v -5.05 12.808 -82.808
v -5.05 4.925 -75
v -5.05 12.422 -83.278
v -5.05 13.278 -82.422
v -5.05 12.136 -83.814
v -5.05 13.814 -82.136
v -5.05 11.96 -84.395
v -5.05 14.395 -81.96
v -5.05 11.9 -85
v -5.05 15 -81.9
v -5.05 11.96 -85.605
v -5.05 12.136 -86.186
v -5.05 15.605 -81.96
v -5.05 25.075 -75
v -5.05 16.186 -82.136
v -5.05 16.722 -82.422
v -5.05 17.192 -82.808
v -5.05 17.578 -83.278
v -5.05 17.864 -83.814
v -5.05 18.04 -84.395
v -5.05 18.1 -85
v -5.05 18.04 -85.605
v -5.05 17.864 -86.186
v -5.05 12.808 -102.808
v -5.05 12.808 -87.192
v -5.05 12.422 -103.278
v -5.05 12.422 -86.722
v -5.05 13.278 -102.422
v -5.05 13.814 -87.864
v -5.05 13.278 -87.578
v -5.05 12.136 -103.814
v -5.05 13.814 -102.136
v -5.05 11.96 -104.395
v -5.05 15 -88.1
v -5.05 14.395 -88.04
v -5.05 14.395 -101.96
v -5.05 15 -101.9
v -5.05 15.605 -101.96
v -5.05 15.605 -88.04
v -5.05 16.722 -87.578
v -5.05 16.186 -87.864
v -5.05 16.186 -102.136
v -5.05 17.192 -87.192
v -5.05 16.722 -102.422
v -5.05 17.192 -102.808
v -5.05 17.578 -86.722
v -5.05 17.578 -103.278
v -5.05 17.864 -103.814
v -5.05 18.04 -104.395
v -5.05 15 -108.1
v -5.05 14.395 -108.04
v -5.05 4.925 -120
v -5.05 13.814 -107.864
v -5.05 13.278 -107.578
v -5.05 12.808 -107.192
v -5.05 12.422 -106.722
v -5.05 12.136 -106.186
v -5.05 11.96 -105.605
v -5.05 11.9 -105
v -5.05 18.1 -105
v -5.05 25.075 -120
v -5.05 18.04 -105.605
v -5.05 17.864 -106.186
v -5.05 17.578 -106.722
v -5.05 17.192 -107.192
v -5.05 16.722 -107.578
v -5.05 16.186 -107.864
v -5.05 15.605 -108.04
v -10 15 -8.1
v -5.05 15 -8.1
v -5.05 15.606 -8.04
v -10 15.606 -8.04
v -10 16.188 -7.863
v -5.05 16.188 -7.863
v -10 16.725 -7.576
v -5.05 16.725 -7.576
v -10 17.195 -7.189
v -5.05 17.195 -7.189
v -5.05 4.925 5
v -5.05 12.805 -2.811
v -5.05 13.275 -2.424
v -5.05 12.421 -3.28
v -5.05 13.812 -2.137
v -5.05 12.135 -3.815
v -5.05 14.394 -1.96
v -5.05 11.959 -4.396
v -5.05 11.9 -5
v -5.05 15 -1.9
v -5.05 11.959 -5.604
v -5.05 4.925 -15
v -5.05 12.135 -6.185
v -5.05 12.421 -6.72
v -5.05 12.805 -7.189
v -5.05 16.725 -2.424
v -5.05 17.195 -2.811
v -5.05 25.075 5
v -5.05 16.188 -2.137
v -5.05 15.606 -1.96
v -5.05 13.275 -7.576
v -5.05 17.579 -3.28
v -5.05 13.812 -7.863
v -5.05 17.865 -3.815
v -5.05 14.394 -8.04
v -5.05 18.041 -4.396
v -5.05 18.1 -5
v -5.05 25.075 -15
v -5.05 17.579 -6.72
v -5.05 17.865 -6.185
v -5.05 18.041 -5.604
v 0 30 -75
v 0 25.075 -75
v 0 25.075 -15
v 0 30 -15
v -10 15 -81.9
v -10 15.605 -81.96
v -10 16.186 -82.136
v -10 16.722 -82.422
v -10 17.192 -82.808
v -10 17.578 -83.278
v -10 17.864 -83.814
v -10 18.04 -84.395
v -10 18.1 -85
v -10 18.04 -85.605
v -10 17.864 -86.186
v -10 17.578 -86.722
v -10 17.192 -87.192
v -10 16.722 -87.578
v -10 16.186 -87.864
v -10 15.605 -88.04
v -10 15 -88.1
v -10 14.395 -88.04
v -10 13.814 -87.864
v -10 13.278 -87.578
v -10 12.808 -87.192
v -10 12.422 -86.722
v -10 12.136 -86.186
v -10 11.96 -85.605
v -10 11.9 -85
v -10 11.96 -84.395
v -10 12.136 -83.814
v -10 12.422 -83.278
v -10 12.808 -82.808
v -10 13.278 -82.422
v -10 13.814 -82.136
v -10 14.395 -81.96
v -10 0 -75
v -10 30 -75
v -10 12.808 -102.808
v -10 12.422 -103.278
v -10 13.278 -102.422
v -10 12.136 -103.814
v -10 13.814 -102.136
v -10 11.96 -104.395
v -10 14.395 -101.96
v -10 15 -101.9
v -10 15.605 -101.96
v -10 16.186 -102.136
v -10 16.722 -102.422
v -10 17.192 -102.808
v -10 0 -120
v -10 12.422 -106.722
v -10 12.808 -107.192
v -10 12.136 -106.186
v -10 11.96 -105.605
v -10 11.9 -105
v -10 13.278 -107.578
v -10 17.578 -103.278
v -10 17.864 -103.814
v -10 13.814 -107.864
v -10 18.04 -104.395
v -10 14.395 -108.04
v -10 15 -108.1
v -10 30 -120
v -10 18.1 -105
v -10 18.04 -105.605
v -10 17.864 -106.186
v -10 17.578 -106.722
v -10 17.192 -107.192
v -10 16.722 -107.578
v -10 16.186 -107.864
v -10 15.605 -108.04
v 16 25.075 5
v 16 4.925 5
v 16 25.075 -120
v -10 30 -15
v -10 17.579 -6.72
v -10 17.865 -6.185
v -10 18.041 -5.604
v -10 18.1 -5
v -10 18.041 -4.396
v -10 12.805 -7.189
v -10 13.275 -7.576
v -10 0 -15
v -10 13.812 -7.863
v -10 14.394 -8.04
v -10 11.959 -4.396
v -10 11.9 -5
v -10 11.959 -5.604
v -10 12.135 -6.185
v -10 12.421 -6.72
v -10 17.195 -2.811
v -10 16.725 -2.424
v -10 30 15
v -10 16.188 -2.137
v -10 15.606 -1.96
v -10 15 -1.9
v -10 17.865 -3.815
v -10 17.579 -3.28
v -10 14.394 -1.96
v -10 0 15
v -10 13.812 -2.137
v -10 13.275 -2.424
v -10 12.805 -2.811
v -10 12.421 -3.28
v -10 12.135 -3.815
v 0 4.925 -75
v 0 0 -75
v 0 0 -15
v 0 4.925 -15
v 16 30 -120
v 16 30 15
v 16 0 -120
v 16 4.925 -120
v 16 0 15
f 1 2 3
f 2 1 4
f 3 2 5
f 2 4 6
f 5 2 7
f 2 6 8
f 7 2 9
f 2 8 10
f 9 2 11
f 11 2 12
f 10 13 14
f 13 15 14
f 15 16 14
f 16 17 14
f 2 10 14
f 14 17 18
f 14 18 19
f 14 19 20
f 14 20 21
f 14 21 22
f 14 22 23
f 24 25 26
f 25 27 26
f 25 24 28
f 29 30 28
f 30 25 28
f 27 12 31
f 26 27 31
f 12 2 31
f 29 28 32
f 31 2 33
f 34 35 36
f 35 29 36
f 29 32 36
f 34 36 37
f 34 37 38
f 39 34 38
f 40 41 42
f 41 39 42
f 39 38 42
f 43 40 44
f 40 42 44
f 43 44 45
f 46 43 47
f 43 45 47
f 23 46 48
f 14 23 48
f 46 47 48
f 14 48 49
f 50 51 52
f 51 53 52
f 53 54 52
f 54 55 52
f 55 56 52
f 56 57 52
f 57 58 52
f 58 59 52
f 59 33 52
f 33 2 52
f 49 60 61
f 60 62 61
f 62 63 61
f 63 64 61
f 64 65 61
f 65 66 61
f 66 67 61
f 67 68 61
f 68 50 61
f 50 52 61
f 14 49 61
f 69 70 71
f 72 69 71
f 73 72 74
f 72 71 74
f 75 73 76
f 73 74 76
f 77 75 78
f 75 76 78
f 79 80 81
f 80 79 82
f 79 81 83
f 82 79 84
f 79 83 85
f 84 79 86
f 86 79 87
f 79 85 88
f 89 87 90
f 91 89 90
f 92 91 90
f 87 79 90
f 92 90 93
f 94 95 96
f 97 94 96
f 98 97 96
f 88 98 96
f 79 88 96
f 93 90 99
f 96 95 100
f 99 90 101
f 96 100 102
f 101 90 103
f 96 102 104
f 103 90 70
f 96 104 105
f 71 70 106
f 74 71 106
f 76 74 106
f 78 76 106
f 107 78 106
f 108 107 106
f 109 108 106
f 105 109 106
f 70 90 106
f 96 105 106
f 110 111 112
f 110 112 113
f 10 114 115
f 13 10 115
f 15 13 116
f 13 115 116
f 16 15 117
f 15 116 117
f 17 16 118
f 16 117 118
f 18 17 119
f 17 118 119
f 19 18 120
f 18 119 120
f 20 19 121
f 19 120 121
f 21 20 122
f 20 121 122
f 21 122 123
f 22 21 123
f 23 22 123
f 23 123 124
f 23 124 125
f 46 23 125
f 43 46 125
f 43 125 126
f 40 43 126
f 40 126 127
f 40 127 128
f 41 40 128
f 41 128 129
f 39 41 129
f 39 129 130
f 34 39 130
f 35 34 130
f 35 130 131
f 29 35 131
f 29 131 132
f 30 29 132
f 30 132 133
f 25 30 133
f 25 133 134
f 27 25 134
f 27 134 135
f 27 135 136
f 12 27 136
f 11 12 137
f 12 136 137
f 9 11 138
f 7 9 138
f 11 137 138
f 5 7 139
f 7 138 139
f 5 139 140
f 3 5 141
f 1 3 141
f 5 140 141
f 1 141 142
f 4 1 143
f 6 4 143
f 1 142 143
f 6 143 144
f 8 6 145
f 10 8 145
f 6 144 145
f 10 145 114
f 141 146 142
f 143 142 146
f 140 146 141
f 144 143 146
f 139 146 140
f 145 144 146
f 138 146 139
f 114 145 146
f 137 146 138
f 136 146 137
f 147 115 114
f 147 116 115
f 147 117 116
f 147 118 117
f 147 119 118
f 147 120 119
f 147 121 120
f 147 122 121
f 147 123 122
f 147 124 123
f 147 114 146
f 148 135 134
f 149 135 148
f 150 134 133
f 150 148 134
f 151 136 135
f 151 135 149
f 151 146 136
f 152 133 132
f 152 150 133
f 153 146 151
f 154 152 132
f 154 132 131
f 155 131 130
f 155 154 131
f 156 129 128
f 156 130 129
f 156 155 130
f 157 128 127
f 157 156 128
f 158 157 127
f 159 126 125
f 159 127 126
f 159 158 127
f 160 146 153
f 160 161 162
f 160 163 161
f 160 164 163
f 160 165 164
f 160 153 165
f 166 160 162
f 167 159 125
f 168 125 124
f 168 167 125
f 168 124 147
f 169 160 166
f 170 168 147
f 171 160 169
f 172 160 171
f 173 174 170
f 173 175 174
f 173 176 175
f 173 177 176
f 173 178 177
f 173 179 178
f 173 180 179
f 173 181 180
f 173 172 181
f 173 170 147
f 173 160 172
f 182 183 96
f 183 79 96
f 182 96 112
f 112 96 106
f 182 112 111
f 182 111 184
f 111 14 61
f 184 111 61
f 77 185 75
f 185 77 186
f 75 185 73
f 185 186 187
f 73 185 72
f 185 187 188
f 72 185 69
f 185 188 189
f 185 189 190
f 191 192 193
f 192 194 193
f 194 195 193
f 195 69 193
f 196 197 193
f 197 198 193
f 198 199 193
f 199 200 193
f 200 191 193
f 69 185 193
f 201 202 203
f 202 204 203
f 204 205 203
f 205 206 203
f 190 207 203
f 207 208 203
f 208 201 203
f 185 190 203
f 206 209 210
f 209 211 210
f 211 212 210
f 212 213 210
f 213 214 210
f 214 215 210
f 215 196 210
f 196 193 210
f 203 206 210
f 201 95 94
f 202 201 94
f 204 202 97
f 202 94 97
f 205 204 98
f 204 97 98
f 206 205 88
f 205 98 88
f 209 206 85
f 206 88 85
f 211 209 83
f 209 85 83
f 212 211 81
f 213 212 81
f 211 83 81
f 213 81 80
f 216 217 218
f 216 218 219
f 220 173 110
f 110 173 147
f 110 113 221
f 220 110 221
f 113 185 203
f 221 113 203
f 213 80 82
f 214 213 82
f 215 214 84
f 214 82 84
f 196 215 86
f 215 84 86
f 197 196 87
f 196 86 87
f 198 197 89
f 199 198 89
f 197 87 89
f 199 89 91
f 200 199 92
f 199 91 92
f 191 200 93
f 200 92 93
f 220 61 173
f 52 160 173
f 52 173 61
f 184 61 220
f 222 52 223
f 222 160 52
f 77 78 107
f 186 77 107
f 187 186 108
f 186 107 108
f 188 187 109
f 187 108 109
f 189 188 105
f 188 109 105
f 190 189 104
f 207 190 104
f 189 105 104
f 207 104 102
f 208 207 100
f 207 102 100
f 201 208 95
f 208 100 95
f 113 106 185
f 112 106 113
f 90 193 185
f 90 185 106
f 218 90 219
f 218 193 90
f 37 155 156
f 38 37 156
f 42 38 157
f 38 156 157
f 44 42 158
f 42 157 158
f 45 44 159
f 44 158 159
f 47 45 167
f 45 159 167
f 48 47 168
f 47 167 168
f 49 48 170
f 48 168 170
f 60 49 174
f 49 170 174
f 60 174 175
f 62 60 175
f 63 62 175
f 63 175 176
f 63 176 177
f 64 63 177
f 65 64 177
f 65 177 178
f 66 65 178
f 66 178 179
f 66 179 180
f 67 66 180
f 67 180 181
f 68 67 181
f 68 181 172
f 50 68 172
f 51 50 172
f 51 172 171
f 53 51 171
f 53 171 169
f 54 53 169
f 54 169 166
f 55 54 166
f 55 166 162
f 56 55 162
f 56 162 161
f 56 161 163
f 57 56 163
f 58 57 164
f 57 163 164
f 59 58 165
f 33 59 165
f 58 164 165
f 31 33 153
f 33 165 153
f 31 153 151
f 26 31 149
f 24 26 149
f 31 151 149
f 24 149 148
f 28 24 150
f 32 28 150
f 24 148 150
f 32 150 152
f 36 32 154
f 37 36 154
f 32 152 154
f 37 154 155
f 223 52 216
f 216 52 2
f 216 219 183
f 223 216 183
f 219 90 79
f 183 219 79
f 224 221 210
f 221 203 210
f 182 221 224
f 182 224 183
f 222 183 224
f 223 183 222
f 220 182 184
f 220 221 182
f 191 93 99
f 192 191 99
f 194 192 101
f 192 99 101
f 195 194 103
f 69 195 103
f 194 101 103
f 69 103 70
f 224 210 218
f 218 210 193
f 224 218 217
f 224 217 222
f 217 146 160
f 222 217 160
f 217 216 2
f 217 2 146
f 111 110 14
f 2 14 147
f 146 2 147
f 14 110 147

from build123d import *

# Parameters (mm, degrees)
SKETCH_1_W          = 30
SKETCH_1_H          = 30
EXTRUDE_1_DEPTH     = 30
SKETCH_2_W          = 20
SKETCH_2_H          = 20.05
CUT_EXTRUDE_1_DEPTH = 20
CUT_EXTRUDE_2_DEPTH = 20
SKETCH_4_W          = 5
SKETCH_4_H          = 30
CUT_EXTRUDE_3_DEPTH = 55
SKETCH_5_W          = 15
SKETCH_5_H          = 4.975
EXTRUDE_2_DEPTH     = 120
EXTRUDE_3_DEPTH     = 60
SKETCH_7_R          = 3.1
CUT_EXTRUDE_4_DEPTH = 60
CUT_EXTRUDE_5_REACH = 155.704
SKETCH_8_W          = 20.1
SKETCH_8_H          = 20.15
EXTRUDE_4_DEPTH     = 1
SKETCH_10_W         = 26
SKETCH_10_H         = 15
CUT_EXTRUDE_6_DEPTH = 87


with BuildPart() as part:
    # 草图1 → 凸台-拉伸1 (new body)
    with BuildSketch(Plane(origin=(0, 0, 0), x_dir=(1, 0, 0), z_dir=(0, 1, 0))):
        Rectangle(SKETCH_1_W, SKETCH_1_H)
    extrude(amount=EXTRUDE_1_DEPTH)

    # 草图2 → 切除-拉伸1 (cut)
    with BuildSketch(Plane(origin=(15, 0, 0), x_dir=(0, 0, -1), z_dir=(1, 0, 0))):
        with Locations((5, 15)):
            Rectangle(SKETCH_2_W, SKETCH_2_H)
    extrude(amount=-CUT_EXTRUDE_1_DEPTH, mode=Mode.SUBTRACT)

    # 草图3 → 切除-拉伸2 (cut)
    with BuildSketch(Plane(origin=(-5, 0, 0), x_dir=(0, 0, -1), z_dir=(1, 0, 0))):
        with BuildLine():
            ThreePointArc((7.189292698, 17.194765929), (5, 18.1), (2.810707302, 17.194765929))
            Line((2.810707302, 17.194765929), (5, 15))
            Line((5, 15), (7.189292698, 17.194765929))
        make_face()
        with BuildLine():
            Line((5, 15), (2.810707302, 17.194765929))
            ThreePointArc((2.810707302, 17.194765929), (1.9, 15), (2.810707302, 12.805234071))
            Line((2.810707302, 12.805234071), (5, 15))
        make_face()
        with BuildLine():
            Line((7.189292698, 17.194765929), (5, 15))
            Line((5, 15), (7.189292698, 12.805234071))
            ThreePointArc((7.189292698, 12.805234071), (7.86328547, 13.81189381), (8.1, 15))
            ThreePointArc((8.1, 15), (7.86328547, 16.18810619), (7.189292698, 17.194765929))
        make_face()
        with BuildLine():
            Line((7.189292698, 12.805234071), (5, 15))
            Line((5, 15), (2.810707302, 12.805234071))
            ThreePointArc((2.810707302, 12.805234071), (5, 11.9), (7.189292698, 12.805234071))
        make_face()
    extrude(amount=-CUT_EXTRUDE_2_DEPTH, mode=Mode.SUBTRACT)

    # 草图4 → 切除-拉伸3 (cut)
    with BuildSketch(Plane.XZ):
        with Locations((-12.5, 0)):
            Rectangle(SKETCH_4_W, SKETCH_4_H)
    extrude(amount=-CUT_EXTRUDE_3_DEPTH, mode=Mode.SUBTRACT)

    # 草图5 → 凸台-拉伸2 (add)
    with BuildSketch(Plane(origin=(0, 0, -15), x_dir=(-1, 0, 0), z_dir=(0, 0, -1))):
        with Locations((-7.5, 27.5125)):
            Rectangle(SKETCH_5_W, SKETCH_5_H)
        with Locations((-7.5, 2.4875)):
            Rectangle(SKETCH_5_W, SKETCH_5_H)
    extrude(amount=EXTRUDE_2_DEPTH)

    # 草图6 → 凸台-拉伸3 (add)
    with BuildSketch(Plane(origin=(0, 0, -135), x_dir=(-1, 0, 0), z_dir=(0, 0, -1))):
        Polygon((5, 4.975), (0, 4.975), (0, 0), (10, 0), (10, 30), (0, 30), (0, 25.025), (5, 25.025), align=None)
    extrude(amount=-EXTRUDE_3_DEPTH)

    # 草图7 → 切除-拉伸4 (cut)
    with BuildSketch(Plane.ZY.offset(10)):
        with Locations((-105, 15)):
            Circle(SKETCH_7_R)
        with Locations((-85, 15)):
            Circle(SKETCH_7_R)
    extrude(amount=-CUT_EXTRUDE_4_DEPTH, mode=Mode.SUBTRACT)

    # 切除-拉伸5: up to this face of the body (flat: up to its plane)
    cut_extrude_5_end = Plane(part.part.faces().sort_by_distance((5, 15, 5))[0])
    # 草图8 → 切除-拉伸5 (cut, up to the picked face)
    with BuildSketch(Plane(origin=(0, 0, -135), x_dir=(-1, 0, 0), z_dir=(0, 0, -1)), mode=Mode.PRIVATE) as cut_extrude_5_sk1:
        with Locations((-5, 15)):
            Rectangle(SKETCH_8_W, SKETCH_8_H)
    cut_extrude_5_tool1 = split(extrude(cut_extrude_5_sk1.sketch, amount=-CUT_EXTRUDE_5_REACH, mode=Mode.PRIVATE), bisect_by=cut_extrude_5_end, keep=Keep.BOTH, mode=Mode.PRIVATE)
    add(cut_extrude_5_tool1.solids().sort_by(Axis((5, 15, -135), (0, 0, 1)))[0], mode=Mode.SUBTRACT)

    # 草图9 → 凸台-拉伸4 (add)
    with BuildSketch(Plane(origin=(15, 0, 0), x_dir=(0, 0, -1), z_dir=(1, 0, 0))):
        Polygon((135, 4.925), (-5, 4.925), (-5, 25.075), (135, 25.075), (135, 30), (-15, 30), (-15, 0), (135, 0), align=None)
    extrude(amount=EXTRUDE_4_DEPTH)

    # 草图10 → 切除-拉伸6 (cut)
    with BuildSketch(Plane.XZ):
        with Locations((3, -127.5)):
            Rectangle(SKETCH_10_W, SKETCH_10_H)
    extrude(amount=-CUT_EXTRUDE_6_DEPTH, mode=Mode.SUBTRACT)


solid = part.part
